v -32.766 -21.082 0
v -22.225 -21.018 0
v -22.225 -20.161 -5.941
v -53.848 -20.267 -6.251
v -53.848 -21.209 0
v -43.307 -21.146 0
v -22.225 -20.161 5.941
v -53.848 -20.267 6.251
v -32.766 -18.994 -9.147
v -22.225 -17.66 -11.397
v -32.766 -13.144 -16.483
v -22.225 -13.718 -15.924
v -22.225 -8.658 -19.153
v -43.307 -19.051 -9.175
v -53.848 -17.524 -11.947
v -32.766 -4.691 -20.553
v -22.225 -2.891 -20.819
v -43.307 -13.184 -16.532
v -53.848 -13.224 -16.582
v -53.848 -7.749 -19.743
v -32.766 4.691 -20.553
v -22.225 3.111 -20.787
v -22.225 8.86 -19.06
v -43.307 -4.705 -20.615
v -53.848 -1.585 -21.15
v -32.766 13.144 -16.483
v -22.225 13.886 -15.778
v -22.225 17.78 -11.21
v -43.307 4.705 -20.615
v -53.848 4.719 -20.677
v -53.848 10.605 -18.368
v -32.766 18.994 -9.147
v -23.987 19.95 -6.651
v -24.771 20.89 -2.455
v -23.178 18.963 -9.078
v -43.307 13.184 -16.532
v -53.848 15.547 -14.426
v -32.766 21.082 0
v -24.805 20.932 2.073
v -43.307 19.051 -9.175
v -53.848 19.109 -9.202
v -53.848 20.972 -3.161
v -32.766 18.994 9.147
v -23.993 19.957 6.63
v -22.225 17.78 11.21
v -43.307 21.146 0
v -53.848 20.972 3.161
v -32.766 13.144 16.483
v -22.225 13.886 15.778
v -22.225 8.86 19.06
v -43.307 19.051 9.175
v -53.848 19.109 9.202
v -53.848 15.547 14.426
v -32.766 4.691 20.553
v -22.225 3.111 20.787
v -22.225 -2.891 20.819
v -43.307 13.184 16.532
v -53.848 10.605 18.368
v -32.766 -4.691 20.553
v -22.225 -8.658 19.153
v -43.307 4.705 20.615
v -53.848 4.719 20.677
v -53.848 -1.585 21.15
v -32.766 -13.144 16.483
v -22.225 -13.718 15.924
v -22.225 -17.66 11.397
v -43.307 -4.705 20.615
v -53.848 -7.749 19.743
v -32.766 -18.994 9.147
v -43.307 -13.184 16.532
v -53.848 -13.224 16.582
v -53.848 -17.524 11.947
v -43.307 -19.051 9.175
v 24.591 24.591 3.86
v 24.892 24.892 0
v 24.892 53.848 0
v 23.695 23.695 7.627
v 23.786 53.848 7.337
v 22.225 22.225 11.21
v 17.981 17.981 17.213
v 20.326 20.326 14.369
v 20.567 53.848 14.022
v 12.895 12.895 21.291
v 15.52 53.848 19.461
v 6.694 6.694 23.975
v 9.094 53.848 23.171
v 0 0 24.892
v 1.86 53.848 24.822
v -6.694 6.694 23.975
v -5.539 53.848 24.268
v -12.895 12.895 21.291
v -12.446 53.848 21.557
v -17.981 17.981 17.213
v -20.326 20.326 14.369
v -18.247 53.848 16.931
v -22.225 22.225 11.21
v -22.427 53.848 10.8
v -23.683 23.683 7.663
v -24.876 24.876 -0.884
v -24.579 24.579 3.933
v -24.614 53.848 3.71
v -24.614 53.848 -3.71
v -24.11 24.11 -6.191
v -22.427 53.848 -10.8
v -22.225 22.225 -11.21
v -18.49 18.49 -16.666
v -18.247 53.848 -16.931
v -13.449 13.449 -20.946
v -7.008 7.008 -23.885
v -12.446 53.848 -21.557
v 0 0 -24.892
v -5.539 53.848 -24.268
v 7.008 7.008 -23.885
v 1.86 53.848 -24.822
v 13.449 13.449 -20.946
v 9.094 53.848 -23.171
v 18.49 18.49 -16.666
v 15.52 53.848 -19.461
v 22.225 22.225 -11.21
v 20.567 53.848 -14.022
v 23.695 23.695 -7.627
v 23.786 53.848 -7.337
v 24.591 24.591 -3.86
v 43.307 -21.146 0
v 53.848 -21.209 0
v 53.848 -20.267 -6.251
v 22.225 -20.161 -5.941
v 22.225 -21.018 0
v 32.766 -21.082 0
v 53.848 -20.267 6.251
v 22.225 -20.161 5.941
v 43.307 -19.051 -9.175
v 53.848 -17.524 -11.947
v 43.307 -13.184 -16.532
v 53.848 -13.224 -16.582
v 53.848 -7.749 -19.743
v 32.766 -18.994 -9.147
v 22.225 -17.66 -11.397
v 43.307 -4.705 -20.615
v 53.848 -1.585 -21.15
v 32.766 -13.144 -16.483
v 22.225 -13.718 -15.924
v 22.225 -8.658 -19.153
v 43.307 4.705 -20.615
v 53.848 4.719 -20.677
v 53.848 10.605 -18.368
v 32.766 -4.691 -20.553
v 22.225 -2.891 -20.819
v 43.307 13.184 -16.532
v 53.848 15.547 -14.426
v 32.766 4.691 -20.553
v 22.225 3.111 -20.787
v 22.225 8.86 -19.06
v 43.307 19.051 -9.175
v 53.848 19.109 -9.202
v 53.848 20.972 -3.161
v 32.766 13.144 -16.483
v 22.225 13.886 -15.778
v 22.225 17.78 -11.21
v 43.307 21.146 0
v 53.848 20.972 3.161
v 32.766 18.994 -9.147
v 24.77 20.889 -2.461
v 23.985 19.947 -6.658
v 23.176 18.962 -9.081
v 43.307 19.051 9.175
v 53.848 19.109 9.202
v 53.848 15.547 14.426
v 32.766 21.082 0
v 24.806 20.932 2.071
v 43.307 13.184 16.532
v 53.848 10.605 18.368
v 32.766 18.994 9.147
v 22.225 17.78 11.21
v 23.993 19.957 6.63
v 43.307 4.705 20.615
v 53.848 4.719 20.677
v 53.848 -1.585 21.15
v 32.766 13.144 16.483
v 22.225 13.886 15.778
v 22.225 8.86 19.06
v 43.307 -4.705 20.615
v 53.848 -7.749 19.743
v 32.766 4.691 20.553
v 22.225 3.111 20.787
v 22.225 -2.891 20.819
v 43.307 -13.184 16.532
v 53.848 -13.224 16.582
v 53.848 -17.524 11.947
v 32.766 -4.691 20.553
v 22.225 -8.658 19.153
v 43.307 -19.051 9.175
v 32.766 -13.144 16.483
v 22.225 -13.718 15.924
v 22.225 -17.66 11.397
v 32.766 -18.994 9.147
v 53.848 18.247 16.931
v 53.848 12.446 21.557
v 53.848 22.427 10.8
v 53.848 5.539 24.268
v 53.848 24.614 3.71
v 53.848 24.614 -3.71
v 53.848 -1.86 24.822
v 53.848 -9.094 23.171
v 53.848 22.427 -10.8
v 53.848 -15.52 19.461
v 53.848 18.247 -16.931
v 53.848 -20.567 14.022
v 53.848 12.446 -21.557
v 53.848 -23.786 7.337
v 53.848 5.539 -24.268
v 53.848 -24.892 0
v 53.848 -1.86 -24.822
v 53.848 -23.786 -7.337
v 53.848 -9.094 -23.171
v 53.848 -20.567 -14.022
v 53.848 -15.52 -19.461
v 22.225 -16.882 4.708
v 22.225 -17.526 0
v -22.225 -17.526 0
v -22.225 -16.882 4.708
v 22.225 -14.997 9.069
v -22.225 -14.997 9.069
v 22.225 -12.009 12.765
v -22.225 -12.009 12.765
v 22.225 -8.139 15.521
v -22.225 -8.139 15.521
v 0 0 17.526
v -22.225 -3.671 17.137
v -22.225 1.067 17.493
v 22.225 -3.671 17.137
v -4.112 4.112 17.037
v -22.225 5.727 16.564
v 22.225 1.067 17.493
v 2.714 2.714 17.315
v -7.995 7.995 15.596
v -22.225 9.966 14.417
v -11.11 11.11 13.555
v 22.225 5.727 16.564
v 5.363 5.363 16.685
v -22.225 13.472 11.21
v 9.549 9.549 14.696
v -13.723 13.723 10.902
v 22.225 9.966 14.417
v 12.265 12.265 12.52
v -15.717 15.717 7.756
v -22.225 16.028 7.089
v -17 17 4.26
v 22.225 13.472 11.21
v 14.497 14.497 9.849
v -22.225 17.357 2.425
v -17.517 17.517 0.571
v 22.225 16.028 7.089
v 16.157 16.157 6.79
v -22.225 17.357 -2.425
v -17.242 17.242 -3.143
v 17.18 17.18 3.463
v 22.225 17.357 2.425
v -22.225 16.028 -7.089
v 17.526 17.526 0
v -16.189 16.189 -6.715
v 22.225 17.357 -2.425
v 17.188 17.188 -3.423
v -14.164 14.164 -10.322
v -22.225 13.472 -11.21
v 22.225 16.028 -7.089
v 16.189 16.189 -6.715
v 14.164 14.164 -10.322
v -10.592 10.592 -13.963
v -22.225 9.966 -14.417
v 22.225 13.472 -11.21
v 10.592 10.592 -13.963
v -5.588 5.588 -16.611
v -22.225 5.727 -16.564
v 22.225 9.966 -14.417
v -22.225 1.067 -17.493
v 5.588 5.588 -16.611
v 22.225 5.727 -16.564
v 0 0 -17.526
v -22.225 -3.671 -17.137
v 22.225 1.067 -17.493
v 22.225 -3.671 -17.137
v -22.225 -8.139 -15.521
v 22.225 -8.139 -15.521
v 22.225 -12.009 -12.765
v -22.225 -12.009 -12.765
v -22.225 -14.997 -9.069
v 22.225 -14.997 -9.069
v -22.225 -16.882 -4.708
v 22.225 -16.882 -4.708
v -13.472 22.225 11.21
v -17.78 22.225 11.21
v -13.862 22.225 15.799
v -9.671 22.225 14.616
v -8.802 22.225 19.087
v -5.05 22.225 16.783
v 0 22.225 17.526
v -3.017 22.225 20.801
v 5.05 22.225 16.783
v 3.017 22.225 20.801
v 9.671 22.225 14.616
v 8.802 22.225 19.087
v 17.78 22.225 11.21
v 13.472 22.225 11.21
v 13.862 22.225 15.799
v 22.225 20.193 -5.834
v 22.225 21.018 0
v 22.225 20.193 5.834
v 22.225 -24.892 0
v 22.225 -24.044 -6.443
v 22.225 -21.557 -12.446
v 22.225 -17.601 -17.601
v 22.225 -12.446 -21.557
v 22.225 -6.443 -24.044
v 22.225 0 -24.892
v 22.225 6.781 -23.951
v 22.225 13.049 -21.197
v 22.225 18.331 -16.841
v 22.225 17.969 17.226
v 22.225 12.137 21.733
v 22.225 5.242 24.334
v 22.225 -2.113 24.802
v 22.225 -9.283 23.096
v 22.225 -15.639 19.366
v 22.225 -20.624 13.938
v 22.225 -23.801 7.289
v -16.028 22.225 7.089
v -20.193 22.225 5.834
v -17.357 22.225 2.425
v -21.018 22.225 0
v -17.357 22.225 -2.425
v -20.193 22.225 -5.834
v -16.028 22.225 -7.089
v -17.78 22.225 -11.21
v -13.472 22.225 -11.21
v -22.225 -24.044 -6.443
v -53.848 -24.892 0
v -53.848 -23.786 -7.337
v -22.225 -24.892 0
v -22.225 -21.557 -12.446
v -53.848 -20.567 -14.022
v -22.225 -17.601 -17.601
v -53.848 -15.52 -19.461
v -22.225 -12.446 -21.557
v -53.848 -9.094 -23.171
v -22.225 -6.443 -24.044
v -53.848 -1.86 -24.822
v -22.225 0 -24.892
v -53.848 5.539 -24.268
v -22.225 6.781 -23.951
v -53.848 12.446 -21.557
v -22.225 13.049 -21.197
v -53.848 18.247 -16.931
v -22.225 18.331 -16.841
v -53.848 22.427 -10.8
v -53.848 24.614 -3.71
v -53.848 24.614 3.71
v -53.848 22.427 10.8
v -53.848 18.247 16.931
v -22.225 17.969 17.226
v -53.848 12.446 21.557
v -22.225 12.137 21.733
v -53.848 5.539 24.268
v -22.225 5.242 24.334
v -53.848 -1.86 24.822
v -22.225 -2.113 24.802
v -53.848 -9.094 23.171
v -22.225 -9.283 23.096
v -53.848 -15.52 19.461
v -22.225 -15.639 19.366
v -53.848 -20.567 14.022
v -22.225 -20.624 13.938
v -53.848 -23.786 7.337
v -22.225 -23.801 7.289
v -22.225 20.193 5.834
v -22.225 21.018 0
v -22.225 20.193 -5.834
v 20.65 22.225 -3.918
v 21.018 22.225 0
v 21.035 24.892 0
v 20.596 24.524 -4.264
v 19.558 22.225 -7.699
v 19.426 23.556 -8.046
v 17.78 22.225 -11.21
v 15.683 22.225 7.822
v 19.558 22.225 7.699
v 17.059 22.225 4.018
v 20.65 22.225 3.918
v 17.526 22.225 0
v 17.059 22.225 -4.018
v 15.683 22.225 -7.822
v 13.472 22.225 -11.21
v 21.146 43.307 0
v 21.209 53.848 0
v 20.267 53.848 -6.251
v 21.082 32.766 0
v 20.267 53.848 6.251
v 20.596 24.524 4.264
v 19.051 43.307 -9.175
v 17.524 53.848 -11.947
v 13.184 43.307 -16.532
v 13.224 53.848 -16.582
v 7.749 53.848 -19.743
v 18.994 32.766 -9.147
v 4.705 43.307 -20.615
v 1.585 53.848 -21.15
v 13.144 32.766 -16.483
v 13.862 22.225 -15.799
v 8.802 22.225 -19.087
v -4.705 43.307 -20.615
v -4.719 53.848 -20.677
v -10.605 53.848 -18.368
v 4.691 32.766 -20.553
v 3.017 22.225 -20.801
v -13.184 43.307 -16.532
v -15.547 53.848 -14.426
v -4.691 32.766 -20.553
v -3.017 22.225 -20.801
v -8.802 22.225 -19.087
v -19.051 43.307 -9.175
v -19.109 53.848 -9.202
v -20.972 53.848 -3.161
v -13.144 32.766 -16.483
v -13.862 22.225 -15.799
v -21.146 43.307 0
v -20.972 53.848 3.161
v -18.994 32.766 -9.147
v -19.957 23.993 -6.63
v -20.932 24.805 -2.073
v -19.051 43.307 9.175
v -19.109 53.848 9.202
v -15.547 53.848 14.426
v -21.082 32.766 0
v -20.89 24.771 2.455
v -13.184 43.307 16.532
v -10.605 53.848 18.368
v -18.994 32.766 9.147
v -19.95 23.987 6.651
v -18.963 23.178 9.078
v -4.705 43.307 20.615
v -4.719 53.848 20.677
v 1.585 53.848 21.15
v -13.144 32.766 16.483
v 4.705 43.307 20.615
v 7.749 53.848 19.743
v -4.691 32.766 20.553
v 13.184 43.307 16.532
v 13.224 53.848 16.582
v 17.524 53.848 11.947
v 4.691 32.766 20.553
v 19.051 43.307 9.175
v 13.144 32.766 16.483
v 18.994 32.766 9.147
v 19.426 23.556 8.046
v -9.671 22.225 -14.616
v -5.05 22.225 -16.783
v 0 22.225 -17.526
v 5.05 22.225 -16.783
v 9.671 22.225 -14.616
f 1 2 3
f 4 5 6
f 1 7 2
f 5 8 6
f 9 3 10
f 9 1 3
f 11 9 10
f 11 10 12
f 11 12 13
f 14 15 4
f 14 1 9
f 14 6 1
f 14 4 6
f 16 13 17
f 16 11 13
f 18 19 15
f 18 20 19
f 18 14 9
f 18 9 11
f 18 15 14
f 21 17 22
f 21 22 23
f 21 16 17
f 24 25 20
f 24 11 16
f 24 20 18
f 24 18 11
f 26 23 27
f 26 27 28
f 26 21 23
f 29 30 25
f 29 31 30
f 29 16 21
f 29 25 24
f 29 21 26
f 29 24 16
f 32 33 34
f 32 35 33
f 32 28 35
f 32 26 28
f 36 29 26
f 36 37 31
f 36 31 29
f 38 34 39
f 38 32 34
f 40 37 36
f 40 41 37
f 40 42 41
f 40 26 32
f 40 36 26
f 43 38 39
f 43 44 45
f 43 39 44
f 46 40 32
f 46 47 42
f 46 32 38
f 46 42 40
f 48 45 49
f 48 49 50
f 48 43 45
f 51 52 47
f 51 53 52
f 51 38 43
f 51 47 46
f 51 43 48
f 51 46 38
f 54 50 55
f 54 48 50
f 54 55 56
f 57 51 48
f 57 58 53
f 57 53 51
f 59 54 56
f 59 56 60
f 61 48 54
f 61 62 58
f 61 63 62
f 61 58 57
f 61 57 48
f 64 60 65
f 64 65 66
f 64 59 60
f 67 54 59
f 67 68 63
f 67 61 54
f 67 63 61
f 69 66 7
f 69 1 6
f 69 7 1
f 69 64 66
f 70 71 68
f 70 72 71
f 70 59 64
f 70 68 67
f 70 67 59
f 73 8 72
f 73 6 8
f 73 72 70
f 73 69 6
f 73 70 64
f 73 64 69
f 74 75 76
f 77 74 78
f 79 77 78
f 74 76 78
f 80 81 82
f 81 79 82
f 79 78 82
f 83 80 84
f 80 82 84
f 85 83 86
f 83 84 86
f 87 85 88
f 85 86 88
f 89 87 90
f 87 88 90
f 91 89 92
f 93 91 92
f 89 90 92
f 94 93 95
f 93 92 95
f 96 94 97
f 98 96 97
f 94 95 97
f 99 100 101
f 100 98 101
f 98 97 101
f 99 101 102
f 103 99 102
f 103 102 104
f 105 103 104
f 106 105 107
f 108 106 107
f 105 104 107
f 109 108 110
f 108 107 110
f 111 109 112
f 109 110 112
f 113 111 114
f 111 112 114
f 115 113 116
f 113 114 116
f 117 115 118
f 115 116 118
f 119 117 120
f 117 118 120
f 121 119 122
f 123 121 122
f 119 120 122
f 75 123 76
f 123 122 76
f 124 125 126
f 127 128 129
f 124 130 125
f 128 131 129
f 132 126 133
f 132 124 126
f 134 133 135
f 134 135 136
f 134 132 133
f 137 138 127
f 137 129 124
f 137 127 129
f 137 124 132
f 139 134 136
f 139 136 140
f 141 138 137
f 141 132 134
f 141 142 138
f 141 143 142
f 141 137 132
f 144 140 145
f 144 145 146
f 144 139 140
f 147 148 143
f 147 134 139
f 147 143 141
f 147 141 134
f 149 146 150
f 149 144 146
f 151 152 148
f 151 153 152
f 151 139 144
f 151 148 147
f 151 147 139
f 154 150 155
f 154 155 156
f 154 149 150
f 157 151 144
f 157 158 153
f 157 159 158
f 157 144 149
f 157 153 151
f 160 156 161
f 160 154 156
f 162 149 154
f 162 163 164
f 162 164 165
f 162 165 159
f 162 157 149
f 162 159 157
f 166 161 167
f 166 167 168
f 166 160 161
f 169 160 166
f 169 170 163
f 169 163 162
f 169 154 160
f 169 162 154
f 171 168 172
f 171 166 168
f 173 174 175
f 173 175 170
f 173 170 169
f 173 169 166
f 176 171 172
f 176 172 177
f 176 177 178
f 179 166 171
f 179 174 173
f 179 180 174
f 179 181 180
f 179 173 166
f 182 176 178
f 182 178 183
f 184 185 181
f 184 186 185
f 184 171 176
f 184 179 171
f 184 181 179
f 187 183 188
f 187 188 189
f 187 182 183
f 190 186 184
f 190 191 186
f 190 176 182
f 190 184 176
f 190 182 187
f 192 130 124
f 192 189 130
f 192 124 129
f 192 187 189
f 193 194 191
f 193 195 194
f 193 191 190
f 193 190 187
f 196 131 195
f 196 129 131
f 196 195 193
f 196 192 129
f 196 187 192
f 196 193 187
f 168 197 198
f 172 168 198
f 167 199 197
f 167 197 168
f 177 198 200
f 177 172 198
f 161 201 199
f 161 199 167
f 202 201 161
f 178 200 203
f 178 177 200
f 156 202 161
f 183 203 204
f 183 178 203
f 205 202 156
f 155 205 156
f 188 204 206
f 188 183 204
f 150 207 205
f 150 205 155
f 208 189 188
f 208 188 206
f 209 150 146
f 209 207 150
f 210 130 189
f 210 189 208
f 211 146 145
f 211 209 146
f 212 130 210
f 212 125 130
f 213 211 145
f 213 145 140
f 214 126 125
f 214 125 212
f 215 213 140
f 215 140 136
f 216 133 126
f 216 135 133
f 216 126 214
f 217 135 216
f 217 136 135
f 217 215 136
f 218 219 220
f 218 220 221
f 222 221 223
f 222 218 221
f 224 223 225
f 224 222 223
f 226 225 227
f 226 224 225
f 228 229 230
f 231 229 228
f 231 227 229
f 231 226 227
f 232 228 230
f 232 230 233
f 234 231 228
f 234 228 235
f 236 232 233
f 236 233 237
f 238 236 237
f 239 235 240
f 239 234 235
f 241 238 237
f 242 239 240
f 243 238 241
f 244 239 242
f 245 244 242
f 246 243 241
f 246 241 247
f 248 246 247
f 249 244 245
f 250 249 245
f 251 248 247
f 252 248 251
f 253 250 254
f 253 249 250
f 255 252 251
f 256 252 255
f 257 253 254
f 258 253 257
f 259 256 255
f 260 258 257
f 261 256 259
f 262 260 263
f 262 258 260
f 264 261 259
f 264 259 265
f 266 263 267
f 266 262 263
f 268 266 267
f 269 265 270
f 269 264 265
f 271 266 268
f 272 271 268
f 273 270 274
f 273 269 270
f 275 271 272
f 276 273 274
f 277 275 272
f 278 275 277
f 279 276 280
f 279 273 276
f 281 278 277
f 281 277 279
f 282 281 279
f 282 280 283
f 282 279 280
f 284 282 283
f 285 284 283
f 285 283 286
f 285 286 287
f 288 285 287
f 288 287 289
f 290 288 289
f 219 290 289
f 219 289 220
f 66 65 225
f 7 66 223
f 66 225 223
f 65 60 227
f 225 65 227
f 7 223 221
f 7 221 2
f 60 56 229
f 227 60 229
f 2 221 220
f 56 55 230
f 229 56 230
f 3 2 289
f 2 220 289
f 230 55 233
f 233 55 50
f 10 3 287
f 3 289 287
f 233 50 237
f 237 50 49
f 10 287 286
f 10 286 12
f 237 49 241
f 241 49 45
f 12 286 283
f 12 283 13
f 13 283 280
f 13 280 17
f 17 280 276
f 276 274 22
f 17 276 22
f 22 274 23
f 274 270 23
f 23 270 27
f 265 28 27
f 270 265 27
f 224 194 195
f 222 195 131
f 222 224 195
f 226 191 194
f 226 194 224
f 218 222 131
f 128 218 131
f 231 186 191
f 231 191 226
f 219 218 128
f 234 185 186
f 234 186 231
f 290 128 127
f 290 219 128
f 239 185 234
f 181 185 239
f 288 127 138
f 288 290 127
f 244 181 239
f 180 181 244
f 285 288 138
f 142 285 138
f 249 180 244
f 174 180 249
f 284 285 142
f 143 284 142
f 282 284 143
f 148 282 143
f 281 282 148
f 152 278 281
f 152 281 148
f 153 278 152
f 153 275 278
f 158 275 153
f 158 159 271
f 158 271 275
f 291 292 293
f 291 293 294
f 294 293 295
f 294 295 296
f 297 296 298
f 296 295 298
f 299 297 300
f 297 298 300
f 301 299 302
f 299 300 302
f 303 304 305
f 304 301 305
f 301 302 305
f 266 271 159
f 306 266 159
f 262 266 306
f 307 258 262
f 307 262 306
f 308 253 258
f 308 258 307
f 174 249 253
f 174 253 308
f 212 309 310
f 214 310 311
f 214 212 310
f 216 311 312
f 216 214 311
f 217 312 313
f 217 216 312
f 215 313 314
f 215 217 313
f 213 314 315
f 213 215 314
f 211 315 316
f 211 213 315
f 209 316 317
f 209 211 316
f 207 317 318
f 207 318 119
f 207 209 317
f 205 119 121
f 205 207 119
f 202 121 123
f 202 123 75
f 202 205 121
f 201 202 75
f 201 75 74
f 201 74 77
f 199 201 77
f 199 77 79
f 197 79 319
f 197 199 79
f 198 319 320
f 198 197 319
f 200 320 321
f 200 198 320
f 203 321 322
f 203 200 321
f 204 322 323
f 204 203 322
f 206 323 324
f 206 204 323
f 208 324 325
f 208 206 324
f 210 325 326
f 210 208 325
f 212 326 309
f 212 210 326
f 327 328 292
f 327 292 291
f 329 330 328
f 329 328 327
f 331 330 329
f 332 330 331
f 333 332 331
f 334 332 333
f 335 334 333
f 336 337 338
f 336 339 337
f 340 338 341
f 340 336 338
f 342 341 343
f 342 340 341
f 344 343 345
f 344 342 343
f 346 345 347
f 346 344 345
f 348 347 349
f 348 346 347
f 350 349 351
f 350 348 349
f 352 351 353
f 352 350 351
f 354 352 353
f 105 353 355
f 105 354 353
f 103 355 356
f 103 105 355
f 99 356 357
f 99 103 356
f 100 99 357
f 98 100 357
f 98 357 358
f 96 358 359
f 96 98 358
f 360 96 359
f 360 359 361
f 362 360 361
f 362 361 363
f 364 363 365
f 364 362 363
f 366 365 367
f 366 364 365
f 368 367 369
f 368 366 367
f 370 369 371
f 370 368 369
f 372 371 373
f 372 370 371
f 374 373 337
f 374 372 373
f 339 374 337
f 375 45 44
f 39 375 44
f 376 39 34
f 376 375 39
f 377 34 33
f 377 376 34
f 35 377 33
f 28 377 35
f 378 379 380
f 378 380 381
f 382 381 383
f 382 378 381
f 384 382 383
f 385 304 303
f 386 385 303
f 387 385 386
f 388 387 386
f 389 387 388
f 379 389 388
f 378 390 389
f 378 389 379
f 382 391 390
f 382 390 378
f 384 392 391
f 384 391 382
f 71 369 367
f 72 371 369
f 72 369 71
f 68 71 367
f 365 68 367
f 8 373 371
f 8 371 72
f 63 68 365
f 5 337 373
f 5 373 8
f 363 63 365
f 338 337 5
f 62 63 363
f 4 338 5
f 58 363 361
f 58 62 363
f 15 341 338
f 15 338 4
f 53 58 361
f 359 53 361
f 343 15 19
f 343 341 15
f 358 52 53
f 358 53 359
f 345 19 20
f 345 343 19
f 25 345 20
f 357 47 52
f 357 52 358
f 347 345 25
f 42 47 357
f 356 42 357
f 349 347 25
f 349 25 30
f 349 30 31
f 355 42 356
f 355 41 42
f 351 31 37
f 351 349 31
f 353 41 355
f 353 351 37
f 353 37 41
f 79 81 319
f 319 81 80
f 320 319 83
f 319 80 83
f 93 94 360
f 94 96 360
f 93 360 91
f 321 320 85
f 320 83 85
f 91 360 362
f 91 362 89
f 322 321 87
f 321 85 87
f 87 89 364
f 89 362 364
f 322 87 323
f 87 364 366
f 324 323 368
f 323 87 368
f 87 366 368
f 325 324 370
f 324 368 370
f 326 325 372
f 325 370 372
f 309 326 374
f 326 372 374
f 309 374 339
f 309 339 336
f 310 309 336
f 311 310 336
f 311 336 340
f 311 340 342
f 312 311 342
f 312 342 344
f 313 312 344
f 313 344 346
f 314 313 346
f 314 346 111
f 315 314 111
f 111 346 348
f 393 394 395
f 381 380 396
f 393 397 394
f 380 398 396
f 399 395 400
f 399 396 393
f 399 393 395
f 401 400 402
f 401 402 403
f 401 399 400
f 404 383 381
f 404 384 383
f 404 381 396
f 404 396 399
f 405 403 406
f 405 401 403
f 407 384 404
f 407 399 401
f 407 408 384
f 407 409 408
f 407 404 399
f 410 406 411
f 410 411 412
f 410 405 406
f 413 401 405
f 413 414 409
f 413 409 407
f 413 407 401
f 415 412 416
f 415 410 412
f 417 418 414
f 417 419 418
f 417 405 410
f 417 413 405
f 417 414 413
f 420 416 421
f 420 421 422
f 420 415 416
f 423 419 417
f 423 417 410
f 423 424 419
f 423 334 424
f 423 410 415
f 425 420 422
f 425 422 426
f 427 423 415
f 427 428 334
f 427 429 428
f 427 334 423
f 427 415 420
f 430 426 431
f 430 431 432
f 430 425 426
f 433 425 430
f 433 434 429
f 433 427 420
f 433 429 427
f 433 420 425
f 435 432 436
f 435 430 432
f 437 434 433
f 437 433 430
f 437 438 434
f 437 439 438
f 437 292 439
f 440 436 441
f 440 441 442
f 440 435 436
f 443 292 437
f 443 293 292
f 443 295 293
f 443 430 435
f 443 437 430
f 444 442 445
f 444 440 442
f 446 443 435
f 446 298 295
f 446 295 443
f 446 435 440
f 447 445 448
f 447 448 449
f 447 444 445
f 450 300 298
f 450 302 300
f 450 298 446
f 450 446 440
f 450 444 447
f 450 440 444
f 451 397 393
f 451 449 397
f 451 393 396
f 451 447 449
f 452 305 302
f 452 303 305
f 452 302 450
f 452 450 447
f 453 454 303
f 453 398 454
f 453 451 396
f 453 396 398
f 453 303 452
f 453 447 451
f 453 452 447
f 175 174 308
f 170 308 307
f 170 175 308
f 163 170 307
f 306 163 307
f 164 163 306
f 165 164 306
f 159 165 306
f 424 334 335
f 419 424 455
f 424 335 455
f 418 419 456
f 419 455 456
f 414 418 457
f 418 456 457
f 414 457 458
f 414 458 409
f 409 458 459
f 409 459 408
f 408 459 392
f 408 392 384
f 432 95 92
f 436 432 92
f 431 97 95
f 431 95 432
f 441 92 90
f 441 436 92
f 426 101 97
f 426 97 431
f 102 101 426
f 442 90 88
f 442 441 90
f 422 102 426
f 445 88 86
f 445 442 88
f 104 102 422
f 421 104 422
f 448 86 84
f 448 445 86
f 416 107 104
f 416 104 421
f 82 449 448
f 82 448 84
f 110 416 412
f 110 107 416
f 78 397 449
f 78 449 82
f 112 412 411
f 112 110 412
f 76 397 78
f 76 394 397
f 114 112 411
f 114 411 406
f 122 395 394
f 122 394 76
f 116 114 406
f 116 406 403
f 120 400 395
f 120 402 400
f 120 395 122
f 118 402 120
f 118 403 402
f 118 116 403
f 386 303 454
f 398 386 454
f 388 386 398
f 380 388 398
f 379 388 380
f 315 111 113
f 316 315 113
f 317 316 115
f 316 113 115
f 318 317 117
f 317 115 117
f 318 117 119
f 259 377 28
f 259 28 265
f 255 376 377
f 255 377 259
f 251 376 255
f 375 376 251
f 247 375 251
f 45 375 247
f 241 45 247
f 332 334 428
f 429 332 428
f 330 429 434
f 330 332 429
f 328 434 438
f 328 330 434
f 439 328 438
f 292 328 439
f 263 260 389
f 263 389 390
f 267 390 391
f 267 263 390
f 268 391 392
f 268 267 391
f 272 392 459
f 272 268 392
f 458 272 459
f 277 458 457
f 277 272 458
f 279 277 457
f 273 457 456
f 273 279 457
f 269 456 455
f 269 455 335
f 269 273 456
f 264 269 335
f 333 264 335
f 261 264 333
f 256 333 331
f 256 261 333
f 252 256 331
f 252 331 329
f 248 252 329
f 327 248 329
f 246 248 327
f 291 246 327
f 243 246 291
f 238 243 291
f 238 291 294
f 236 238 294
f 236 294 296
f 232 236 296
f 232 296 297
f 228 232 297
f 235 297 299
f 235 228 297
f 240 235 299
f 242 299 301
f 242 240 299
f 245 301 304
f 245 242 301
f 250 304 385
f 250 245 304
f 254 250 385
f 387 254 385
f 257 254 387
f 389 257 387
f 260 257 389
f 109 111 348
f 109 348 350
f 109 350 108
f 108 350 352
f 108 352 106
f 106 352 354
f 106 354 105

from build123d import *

# Parameters (mm, degrees)
SKETCH4_R           = 24.892
BOSS_EXTRUDE1_DEPTH = 44.45
SKETCH5_R           = 24.892
BOSS_EXTRUDE2_DEPTH = 22.225


with BuildPart() as part:
    # Sketch1 → Revolve1 (revolve)
    with BuildSketch(Plane.XY):
        Polygon((-53.848, -24.892), (-22.225, -24.892), (-22.225, -21.0185), (-53.848, -21.209), align=None)
        Polygon((53.848, -21.209), (22.225, -21.0185), (22.225, -24.892), (53.848, -24.892), align=None)
    revolve(axis=Axis((-53.848, 0, 0), (1, 0, 0)))



with BuildPart() as body_2:
    # Sketch2 → Revolve2 (revolve)
    with BuildSketch(Plane.XY):
        Polygon((21.209, 53.848), (21.0185, 22.225), (24.892, 22.225), (24.892, 53.848), align=None)
    revolve(axis=Axis((0, 0, 0), (0, 1, 0)))


with BuildPart() as part_1:
    add(part.part)

    add(body_2.part)  # Boss-Extrude1 merges body 2
    # Sketch4 → Boss-Extrude1 (add)
    with BuildSketch(Plane(origin=(-22.225, 0, 0), x_dir=(0, 0, -1), z_dir=(1, 0, 0))):
        Circle(SKETCH4_R)
    extrude(amount=BOSS_EXTRUDE1_DEPTH)

    # Sketch5 → Boss-Extrude2 (add)
    with BuildSketch(Plane.XZ.offset(-22.225)):
        Circle(SKETCH5_R)
    extrude(amount=BOSS_EXTRUDE2_DEPTH)

    # Sketch6 → Cut-Revolve1 (revolve, cut)
    with BuildSketch(Plane.XY):
        Polygon((-53.848, -21.209), (-22.225, -21.0185), (-22.225, -17.526), (22.225, -17.526), (22.225, -21.0185), (53.848, -21.209), (53.848, 0), (-53.848, 0), align=None)
    revolve(axis=Axis((53.848, 0, 0), (-1, 0, 0)), mode=Mode.SUBTRACT)

    # Sketch7 → Cut-Revolve2 (revolve, cut)
    with BuildSketch(Plane.XY):
        Polygon((21.209, 53.848), (21.0185, 22.225), (17.526, 22.225), (17.526, 0), (0, 0), (0, 53.848), align=None)
    revolve(axis=Axis((0, 0, 0), (0, 1, 0)), mode=Mode.SUBTRACT)


solid = part_1.part
